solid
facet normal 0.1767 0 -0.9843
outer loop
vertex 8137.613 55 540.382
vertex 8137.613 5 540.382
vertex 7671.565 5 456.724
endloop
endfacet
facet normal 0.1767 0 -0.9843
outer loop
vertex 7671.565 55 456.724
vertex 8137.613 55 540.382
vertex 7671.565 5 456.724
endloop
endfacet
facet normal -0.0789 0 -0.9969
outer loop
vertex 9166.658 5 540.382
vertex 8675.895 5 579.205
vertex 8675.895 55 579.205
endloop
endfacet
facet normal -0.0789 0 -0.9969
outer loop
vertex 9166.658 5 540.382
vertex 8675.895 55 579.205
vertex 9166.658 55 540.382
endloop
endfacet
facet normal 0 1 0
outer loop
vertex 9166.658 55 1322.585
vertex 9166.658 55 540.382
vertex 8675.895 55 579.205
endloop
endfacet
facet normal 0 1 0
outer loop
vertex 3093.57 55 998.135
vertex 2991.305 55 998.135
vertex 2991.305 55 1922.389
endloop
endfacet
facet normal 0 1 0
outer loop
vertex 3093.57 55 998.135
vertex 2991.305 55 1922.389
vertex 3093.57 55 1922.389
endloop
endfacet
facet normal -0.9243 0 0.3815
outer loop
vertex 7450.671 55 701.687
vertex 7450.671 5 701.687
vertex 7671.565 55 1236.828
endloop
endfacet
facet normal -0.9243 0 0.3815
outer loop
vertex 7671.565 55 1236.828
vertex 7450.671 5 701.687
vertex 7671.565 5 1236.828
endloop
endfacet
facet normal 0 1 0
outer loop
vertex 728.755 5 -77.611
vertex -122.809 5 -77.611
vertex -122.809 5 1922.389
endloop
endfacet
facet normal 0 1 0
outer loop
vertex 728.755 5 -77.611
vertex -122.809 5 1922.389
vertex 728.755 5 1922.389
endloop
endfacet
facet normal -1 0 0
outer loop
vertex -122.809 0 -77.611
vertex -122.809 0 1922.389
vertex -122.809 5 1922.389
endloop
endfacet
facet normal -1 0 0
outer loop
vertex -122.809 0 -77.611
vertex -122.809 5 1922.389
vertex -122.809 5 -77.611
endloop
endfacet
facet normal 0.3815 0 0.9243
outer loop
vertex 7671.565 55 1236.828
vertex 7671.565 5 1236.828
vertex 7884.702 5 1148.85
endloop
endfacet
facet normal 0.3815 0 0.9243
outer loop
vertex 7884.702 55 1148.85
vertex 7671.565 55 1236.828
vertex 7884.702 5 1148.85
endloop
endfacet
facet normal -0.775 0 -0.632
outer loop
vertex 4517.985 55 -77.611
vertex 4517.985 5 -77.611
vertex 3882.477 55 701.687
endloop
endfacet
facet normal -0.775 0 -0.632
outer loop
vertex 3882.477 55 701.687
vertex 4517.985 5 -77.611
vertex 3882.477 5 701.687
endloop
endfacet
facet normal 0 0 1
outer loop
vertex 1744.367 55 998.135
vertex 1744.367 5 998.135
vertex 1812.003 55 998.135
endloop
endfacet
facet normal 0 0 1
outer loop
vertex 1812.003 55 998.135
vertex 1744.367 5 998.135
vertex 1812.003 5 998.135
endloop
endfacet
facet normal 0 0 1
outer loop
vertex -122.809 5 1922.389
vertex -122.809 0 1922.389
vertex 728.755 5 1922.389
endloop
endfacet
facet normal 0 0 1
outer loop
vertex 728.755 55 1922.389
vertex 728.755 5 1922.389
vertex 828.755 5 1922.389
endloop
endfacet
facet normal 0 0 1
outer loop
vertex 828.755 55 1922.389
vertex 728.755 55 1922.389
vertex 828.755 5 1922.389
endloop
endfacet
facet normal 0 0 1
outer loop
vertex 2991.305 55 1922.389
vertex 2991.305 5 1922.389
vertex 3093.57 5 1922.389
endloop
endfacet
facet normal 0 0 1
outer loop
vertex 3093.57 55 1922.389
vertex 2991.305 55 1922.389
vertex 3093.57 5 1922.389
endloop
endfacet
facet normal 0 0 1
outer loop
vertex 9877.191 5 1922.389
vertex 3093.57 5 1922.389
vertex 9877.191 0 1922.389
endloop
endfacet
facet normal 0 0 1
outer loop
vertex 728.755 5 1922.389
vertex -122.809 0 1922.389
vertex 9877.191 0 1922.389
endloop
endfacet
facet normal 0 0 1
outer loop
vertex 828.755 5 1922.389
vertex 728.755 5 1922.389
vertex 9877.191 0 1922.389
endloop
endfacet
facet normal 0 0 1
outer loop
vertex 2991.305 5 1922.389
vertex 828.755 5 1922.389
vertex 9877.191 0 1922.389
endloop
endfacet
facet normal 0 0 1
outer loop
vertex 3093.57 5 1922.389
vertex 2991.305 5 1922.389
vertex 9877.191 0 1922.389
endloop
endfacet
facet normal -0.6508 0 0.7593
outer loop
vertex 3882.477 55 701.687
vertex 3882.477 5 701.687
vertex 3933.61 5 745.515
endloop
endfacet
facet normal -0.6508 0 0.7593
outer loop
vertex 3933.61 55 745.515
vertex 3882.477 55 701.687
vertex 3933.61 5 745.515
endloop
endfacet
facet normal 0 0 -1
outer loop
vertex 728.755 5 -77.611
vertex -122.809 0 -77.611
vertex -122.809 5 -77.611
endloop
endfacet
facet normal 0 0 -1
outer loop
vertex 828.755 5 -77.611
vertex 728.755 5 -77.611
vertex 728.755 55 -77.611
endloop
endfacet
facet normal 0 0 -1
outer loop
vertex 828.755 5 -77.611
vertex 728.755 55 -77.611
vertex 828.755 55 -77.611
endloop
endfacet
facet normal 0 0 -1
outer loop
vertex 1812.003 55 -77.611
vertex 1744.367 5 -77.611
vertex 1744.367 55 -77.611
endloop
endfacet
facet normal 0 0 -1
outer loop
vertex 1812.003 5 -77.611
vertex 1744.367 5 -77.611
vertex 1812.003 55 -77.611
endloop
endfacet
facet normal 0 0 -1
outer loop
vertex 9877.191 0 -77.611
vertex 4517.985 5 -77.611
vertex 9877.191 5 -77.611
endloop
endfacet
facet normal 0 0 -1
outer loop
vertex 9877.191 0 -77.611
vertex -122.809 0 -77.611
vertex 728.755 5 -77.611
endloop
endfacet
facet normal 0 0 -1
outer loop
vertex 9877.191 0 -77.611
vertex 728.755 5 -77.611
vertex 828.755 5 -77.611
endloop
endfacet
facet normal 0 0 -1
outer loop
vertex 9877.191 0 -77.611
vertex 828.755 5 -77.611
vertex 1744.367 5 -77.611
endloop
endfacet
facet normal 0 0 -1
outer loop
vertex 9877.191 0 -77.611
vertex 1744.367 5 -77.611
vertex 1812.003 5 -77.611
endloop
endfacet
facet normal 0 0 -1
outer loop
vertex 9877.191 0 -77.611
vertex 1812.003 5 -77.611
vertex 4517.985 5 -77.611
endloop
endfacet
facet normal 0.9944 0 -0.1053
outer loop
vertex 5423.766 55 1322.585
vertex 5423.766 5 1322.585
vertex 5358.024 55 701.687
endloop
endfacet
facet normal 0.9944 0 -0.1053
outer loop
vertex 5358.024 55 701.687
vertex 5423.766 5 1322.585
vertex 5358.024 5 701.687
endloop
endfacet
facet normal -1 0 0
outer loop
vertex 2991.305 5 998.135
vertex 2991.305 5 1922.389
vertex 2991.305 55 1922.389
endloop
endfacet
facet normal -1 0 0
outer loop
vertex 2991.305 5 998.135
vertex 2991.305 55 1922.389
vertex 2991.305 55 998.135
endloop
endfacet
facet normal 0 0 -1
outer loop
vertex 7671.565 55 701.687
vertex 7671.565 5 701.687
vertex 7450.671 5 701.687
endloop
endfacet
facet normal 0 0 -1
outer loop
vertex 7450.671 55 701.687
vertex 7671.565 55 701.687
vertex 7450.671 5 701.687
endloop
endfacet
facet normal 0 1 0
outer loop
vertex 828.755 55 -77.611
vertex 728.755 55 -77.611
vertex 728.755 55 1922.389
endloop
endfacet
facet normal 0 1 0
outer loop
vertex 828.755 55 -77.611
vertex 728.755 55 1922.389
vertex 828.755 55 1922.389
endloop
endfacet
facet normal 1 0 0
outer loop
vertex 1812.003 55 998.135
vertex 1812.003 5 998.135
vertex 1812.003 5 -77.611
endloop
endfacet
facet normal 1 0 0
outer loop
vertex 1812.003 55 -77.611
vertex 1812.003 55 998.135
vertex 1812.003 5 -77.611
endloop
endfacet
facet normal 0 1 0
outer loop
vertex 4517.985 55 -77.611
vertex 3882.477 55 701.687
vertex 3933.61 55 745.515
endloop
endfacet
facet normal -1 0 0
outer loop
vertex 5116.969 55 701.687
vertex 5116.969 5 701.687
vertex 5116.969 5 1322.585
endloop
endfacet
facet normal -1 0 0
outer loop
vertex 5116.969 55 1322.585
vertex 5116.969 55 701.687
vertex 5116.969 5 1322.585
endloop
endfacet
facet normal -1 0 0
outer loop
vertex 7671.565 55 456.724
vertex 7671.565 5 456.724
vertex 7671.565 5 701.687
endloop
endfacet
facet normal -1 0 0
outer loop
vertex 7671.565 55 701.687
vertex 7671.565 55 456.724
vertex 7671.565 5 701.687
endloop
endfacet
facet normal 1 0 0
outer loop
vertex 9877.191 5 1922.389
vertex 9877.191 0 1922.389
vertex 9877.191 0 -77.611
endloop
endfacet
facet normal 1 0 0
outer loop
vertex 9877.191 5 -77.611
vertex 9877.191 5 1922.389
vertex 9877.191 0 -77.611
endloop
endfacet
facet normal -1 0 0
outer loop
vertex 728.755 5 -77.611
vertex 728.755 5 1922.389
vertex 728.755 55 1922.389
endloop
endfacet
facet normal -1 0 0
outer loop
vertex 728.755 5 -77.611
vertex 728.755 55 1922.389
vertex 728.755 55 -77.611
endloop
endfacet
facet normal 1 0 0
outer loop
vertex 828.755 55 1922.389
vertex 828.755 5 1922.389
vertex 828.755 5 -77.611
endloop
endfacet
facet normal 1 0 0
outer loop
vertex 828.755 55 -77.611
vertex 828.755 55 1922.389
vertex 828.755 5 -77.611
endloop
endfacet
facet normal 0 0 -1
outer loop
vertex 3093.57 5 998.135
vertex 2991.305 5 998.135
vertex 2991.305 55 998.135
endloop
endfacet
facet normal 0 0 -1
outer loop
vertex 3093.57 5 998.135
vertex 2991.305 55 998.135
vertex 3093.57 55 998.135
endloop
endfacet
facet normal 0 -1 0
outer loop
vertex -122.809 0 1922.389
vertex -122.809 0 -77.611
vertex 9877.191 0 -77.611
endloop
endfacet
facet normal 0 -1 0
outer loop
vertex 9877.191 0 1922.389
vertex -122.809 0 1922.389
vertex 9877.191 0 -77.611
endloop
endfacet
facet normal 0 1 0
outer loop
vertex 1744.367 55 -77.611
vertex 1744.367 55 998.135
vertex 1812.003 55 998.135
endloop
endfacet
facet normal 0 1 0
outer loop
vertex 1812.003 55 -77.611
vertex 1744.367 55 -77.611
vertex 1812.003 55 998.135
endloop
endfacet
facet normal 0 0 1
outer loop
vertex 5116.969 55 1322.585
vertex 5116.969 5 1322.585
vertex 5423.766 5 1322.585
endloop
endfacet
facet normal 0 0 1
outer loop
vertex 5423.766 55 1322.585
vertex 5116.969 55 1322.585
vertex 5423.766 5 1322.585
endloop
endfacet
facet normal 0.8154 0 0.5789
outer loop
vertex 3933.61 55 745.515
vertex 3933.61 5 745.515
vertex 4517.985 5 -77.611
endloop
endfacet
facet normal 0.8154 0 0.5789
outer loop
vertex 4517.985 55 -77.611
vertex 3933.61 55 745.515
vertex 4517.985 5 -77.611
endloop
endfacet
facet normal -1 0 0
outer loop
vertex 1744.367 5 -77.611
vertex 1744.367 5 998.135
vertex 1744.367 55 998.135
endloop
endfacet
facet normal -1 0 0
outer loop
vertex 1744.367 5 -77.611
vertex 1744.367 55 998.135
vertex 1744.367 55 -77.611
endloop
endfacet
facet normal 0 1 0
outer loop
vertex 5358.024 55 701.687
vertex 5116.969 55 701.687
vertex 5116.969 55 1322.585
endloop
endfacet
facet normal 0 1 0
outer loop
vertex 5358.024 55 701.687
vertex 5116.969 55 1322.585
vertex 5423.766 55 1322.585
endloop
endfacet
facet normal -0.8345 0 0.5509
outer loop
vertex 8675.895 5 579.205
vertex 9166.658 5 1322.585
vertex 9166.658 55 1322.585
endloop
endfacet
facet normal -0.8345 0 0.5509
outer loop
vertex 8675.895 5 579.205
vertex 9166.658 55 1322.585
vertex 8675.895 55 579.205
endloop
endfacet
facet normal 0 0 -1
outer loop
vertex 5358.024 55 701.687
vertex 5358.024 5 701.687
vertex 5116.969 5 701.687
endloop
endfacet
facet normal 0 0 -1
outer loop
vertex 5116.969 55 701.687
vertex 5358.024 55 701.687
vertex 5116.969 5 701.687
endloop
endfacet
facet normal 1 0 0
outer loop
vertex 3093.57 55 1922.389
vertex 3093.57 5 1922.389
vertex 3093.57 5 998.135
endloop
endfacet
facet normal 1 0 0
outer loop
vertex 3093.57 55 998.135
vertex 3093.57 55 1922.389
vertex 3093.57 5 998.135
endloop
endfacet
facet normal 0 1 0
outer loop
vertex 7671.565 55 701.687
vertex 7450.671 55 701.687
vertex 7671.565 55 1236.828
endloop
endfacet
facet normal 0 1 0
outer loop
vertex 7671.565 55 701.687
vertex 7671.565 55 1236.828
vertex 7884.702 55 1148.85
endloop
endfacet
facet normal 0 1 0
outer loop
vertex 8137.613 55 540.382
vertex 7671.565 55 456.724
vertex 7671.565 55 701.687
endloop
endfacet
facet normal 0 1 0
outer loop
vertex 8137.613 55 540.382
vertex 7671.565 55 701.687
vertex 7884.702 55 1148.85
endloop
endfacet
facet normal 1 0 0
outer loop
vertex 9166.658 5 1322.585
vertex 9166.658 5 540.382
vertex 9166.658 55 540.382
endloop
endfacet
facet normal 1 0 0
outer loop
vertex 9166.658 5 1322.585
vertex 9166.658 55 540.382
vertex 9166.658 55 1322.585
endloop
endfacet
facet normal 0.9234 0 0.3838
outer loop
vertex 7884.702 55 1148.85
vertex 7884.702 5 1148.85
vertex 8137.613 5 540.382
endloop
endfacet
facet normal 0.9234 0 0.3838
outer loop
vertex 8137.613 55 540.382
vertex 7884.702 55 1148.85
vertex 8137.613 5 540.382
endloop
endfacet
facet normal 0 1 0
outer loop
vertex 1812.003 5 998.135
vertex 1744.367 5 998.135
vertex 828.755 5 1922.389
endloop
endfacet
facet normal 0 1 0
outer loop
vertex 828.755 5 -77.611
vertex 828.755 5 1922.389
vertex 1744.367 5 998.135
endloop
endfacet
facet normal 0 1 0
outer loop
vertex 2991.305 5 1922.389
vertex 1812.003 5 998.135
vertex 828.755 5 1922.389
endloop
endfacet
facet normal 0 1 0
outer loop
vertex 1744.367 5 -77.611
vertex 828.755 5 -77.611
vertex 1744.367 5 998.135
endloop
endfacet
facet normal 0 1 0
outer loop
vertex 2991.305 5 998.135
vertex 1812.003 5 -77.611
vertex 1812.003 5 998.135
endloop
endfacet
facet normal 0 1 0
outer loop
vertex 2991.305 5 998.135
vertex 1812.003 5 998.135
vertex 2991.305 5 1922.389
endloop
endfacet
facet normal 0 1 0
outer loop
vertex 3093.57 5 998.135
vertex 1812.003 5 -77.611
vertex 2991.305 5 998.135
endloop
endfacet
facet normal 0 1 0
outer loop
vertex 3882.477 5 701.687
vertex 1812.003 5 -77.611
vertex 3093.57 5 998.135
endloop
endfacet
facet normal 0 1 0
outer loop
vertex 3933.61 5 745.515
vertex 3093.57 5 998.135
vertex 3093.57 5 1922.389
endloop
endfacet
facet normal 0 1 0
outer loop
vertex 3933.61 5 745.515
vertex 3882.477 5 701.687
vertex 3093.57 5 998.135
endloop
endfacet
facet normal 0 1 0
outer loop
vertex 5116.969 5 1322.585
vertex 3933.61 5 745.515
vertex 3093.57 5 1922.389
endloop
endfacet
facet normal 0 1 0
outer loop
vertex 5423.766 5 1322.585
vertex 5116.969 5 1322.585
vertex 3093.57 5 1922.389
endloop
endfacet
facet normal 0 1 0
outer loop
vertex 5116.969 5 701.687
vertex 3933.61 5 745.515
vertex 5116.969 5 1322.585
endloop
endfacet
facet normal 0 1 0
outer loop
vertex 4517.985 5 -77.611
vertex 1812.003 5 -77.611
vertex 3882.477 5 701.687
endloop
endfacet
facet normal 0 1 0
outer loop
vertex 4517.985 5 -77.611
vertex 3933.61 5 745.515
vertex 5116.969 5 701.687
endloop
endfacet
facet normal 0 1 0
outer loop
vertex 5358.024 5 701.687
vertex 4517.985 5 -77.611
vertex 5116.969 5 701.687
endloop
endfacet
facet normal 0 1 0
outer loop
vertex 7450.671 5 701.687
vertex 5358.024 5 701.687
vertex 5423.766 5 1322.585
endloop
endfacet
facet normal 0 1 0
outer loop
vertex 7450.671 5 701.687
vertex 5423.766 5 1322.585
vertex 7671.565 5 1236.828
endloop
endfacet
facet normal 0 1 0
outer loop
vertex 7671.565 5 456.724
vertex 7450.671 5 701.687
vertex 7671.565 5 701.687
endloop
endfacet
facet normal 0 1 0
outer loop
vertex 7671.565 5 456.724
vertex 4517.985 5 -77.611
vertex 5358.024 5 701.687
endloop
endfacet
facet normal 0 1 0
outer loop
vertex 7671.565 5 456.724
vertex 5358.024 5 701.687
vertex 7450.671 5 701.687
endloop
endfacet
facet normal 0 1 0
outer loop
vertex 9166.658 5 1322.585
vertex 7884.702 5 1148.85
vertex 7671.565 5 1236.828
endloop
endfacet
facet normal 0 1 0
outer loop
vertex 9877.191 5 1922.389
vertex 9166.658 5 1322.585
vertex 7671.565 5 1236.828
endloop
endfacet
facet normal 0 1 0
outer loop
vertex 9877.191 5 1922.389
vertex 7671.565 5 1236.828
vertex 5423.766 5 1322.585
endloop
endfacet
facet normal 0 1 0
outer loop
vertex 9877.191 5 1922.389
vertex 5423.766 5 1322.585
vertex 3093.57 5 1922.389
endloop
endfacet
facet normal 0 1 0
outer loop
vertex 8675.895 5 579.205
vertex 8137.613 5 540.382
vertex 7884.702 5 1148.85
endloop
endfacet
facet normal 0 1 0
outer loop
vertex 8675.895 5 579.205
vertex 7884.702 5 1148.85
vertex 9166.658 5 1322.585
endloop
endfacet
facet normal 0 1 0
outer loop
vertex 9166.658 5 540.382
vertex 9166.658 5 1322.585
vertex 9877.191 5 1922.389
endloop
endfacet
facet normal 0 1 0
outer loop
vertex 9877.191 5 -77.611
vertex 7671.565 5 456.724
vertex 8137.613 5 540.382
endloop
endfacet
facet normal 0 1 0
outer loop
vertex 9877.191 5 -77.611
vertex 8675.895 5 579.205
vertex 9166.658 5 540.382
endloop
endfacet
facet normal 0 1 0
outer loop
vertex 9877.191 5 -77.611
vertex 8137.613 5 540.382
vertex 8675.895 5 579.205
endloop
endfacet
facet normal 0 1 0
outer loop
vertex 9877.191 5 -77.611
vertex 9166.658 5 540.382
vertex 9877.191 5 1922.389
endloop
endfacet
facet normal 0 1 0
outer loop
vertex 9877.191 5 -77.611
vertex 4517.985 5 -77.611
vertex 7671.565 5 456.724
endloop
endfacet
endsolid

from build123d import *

# Parameters (mm, degrees)
SKETCH1_W           = 10000
SKETCH1_H           = 2000
BOSS_EXTRUDE1_DEPTH = 5
SKETCH2_W           = 100
SKETCH2_H           = 2000
SKETCH2_W_2         = 67.636005508
SKETCH2_H_2         = 1075.746504581
SKETCH2_W_3         = 102.265640327
SKETCH2_H_3         = 924.253495419
BOSS_EXTRUDE2_DEPTH = 50


with BuildPart() as part:
    # Sketch1 → Boss-Extrude1 (new body)
    with BuildSketch(Plane(origin=(0, 0, 0), x_dir=(1, 0, 0), z_dir=(0, 1, 0))):
        with Locations((4877.190876351, -922.388955582)):
            Rectangle(SKETCH1_W, SKETCH1_H)
    extrude(amount=BOSS_EXTRUDE1_DEPTH)

    # Sketch2 → Boss-Extrude2 (add)
    with BuildSketch(Plane(origin=(0, 5, 0), x_dir=(1, 0, 0), z_dir=(0, 1, 0))):
        with Locations((778.754642353, -922.388955582)):
            Rectangle(SKETCH2_W, SKETCH2_H)
        with Locations((1778.185391324, -460.262207873)):
            Rectangle(SKETCH2_W_2, SKETCH2_H_2)
        with Locations((3042.437606271, -1460.262207873)):
            Rectangle(SKETCH2_W_3, SKETCH2_H_3)
        Polygon((4517.984702422, 77.611044418), (3882.476794673, -701.686848024), (3933.609614837, -745.514979593), align=None)
        Polygon((5358.023890825, -701.686848024), (5116.969167196, -701.686848024), (5116.969167196, -1322.585378583), (5423.766088178, -1322.585378583), align=None)
        Polygon((7671.564862573, -701.686848024), (7450.671079466, -701.686848024), (7671.564862573, -1236.828334479), (7884.701735774, -1148.850460529), (8137.613165674, -540.381539223), (7671.564862573, -456.723686309), align=None)
        Polygon((9166.658136654, -540.381539223), (9166.658136654, -1322.585378583), (8675.8952631, -579.205267166), align=None)
    extrude(amount=BOSS_EXTRUDE2_DEPTH)


solid = part.part
